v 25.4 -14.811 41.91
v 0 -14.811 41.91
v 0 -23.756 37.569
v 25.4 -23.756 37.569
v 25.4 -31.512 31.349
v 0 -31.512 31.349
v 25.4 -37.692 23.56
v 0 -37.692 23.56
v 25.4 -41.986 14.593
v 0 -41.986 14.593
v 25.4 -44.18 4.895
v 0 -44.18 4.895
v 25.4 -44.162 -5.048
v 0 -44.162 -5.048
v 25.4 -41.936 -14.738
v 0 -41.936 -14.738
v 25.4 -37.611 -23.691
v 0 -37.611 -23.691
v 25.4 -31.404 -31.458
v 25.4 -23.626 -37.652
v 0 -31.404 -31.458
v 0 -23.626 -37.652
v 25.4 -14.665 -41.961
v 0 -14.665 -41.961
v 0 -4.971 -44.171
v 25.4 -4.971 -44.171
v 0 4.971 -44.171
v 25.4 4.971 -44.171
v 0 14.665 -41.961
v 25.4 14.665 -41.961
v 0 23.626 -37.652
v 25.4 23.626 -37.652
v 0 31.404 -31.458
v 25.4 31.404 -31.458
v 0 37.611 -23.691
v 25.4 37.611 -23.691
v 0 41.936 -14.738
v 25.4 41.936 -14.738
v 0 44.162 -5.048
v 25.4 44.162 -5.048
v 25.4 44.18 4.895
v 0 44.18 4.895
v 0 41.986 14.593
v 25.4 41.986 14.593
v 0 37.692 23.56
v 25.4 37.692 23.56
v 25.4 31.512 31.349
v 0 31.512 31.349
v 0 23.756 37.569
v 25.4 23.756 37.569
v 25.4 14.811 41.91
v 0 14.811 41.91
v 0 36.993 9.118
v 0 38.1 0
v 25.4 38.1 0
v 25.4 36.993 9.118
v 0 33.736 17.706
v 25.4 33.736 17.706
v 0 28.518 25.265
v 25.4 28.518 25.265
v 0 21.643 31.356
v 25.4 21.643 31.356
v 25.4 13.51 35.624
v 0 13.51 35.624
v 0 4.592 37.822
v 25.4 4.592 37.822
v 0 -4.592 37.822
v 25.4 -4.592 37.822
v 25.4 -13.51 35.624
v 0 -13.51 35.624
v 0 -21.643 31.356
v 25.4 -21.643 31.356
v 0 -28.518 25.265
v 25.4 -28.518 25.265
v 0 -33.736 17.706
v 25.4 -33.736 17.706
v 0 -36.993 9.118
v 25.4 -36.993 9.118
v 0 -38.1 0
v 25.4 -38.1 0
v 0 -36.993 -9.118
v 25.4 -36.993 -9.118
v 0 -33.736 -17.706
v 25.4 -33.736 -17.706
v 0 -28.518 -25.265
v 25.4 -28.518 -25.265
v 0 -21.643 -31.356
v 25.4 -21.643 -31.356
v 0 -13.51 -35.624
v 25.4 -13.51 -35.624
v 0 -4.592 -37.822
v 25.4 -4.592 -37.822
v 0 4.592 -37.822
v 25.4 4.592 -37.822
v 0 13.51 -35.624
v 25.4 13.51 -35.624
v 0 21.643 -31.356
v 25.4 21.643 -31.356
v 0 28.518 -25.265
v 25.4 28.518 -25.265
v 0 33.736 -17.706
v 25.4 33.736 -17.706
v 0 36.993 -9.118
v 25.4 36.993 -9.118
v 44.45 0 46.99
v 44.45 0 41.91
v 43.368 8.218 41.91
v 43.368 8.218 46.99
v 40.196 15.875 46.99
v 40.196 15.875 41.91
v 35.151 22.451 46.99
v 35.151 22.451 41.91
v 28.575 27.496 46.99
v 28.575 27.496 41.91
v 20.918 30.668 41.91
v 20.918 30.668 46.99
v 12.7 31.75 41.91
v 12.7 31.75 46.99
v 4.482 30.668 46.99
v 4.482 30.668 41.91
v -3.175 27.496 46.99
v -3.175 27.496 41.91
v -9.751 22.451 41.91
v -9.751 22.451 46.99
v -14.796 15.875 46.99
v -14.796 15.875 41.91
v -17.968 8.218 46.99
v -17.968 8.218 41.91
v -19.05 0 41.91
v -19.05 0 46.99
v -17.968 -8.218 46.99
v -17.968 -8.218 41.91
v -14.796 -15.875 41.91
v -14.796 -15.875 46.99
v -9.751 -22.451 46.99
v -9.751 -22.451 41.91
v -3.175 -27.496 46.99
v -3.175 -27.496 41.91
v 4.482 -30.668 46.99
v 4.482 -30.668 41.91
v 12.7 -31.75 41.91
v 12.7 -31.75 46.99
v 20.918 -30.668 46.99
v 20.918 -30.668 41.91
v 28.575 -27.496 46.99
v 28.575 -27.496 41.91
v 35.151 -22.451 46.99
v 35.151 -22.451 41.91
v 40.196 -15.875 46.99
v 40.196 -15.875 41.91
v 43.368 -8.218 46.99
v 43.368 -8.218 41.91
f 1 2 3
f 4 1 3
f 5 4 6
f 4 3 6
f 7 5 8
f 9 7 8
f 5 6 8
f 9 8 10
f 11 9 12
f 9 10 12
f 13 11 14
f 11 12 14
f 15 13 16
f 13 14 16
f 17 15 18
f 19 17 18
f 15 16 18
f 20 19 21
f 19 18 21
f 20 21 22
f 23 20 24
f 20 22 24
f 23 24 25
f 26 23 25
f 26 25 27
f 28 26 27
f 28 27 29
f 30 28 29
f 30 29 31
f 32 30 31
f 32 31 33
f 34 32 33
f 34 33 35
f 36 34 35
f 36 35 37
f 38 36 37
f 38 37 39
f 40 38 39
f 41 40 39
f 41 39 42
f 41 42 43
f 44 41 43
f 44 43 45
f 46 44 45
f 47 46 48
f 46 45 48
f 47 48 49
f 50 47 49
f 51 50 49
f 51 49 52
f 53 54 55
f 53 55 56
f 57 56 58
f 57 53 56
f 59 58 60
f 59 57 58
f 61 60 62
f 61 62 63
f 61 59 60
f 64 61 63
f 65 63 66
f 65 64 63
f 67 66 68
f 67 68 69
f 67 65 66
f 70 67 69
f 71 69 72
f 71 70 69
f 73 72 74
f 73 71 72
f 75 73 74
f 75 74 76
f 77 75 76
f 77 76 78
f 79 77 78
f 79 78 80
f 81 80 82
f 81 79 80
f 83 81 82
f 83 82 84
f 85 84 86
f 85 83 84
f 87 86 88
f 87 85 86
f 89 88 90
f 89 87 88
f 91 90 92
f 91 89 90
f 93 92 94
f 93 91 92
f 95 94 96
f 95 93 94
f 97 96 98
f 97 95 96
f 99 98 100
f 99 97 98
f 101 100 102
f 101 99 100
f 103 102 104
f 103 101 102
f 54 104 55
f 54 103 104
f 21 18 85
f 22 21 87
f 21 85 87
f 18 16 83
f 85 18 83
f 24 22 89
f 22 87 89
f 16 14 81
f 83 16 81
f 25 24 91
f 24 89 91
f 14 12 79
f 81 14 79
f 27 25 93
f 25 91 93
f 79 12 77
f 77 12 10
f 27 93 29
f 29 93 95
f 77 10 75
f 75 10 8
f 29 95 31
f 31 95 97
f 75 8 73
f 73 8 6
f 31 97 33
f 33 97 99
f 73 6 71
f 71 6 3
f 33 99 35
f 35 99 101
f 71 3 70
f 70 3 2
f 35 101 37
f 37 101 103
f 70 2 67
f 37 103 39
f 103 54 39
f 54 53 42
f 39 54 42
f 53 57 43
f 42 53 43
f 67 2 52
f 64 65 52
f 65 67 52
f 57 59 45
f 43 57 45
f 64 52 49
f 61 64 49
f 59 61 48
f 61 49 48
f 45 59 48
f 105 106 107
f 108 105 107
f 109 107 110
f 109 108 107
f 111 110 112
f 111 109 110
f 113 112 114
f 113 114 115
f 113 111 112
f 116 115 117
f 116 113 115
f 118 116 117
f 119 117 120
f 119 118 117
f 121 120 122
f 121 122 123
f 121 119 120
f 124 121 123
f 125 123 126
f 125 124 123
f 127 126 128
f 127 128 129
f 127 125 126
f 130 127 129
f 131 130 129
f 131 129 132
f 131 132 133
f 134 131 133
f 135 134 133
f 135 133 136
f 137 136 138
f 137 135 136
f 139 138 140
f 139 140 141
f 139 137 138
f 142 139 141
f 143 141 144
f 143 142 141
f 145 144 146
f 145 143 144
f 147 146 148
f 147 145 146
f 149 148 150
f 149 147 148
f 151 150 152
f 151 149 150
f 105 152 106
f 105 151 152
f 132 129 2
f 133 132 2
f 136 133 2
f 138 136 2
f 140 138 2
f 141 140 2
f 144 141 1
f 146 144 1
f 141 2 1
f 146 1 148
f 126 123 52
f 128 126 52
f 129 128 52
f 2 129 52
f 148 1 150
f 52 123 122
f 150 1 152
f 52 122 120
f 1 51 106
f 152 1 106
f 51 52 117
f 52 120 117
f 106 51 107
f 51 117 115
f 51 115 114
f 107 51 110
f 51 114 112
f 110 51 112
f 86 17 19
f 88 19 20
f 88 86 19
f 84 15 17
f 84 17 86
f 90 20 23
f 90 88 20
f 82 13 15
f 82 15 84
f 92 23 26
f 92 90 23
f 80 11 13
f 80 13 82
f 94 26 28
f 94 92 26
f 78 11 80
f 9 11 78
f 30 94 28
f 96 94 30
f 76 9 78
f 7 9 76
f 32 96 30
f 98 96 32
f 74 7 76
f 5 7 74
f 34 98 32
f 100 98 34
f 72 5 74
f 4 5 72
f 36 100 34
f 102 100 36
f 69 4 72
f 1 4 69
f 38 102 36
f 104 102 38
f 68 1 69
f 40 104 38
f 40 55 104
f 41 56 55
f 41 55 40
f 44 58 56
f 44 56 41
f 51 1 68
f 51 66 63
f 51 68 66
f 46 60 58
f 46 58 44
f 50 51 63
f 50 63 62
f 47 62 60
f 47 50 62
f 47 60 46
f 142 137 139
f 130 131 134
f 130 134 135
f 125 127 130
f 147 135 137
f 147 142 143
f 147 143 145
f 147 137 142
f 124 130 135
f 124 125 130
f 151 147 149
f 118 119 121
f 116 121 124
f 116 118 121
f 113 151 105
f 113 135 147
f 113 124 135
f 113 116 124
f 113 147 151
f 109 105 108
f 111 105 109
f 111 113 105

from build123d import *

# Parameters (mm, degrees)
F0_R     = 44.45
F0_R_2   = 38.1
F1_DEPTH = 25.4
F3_R     = 31.75
F4_DEPTH = 2.54


with BuildPart() as f1:
    # F0 (on Right) → F1 (new body)
    with BuildSketch(Plane.YZ):
        Circle(F0_R)
        Circle(F0_R_2, mode=Mode.SUBTRACT)
    extrude(amount=F1_DEPTH)

    # F3 (on offset) → F4 (join, symmetric)
    with BuildSketch(Plane.XY.offset(44.45)):
        with Locations((12.7, 0)):
            Circle(F3_R)
    extrude(amount=F4_DEPTH, both=True)


solid = f1.part
